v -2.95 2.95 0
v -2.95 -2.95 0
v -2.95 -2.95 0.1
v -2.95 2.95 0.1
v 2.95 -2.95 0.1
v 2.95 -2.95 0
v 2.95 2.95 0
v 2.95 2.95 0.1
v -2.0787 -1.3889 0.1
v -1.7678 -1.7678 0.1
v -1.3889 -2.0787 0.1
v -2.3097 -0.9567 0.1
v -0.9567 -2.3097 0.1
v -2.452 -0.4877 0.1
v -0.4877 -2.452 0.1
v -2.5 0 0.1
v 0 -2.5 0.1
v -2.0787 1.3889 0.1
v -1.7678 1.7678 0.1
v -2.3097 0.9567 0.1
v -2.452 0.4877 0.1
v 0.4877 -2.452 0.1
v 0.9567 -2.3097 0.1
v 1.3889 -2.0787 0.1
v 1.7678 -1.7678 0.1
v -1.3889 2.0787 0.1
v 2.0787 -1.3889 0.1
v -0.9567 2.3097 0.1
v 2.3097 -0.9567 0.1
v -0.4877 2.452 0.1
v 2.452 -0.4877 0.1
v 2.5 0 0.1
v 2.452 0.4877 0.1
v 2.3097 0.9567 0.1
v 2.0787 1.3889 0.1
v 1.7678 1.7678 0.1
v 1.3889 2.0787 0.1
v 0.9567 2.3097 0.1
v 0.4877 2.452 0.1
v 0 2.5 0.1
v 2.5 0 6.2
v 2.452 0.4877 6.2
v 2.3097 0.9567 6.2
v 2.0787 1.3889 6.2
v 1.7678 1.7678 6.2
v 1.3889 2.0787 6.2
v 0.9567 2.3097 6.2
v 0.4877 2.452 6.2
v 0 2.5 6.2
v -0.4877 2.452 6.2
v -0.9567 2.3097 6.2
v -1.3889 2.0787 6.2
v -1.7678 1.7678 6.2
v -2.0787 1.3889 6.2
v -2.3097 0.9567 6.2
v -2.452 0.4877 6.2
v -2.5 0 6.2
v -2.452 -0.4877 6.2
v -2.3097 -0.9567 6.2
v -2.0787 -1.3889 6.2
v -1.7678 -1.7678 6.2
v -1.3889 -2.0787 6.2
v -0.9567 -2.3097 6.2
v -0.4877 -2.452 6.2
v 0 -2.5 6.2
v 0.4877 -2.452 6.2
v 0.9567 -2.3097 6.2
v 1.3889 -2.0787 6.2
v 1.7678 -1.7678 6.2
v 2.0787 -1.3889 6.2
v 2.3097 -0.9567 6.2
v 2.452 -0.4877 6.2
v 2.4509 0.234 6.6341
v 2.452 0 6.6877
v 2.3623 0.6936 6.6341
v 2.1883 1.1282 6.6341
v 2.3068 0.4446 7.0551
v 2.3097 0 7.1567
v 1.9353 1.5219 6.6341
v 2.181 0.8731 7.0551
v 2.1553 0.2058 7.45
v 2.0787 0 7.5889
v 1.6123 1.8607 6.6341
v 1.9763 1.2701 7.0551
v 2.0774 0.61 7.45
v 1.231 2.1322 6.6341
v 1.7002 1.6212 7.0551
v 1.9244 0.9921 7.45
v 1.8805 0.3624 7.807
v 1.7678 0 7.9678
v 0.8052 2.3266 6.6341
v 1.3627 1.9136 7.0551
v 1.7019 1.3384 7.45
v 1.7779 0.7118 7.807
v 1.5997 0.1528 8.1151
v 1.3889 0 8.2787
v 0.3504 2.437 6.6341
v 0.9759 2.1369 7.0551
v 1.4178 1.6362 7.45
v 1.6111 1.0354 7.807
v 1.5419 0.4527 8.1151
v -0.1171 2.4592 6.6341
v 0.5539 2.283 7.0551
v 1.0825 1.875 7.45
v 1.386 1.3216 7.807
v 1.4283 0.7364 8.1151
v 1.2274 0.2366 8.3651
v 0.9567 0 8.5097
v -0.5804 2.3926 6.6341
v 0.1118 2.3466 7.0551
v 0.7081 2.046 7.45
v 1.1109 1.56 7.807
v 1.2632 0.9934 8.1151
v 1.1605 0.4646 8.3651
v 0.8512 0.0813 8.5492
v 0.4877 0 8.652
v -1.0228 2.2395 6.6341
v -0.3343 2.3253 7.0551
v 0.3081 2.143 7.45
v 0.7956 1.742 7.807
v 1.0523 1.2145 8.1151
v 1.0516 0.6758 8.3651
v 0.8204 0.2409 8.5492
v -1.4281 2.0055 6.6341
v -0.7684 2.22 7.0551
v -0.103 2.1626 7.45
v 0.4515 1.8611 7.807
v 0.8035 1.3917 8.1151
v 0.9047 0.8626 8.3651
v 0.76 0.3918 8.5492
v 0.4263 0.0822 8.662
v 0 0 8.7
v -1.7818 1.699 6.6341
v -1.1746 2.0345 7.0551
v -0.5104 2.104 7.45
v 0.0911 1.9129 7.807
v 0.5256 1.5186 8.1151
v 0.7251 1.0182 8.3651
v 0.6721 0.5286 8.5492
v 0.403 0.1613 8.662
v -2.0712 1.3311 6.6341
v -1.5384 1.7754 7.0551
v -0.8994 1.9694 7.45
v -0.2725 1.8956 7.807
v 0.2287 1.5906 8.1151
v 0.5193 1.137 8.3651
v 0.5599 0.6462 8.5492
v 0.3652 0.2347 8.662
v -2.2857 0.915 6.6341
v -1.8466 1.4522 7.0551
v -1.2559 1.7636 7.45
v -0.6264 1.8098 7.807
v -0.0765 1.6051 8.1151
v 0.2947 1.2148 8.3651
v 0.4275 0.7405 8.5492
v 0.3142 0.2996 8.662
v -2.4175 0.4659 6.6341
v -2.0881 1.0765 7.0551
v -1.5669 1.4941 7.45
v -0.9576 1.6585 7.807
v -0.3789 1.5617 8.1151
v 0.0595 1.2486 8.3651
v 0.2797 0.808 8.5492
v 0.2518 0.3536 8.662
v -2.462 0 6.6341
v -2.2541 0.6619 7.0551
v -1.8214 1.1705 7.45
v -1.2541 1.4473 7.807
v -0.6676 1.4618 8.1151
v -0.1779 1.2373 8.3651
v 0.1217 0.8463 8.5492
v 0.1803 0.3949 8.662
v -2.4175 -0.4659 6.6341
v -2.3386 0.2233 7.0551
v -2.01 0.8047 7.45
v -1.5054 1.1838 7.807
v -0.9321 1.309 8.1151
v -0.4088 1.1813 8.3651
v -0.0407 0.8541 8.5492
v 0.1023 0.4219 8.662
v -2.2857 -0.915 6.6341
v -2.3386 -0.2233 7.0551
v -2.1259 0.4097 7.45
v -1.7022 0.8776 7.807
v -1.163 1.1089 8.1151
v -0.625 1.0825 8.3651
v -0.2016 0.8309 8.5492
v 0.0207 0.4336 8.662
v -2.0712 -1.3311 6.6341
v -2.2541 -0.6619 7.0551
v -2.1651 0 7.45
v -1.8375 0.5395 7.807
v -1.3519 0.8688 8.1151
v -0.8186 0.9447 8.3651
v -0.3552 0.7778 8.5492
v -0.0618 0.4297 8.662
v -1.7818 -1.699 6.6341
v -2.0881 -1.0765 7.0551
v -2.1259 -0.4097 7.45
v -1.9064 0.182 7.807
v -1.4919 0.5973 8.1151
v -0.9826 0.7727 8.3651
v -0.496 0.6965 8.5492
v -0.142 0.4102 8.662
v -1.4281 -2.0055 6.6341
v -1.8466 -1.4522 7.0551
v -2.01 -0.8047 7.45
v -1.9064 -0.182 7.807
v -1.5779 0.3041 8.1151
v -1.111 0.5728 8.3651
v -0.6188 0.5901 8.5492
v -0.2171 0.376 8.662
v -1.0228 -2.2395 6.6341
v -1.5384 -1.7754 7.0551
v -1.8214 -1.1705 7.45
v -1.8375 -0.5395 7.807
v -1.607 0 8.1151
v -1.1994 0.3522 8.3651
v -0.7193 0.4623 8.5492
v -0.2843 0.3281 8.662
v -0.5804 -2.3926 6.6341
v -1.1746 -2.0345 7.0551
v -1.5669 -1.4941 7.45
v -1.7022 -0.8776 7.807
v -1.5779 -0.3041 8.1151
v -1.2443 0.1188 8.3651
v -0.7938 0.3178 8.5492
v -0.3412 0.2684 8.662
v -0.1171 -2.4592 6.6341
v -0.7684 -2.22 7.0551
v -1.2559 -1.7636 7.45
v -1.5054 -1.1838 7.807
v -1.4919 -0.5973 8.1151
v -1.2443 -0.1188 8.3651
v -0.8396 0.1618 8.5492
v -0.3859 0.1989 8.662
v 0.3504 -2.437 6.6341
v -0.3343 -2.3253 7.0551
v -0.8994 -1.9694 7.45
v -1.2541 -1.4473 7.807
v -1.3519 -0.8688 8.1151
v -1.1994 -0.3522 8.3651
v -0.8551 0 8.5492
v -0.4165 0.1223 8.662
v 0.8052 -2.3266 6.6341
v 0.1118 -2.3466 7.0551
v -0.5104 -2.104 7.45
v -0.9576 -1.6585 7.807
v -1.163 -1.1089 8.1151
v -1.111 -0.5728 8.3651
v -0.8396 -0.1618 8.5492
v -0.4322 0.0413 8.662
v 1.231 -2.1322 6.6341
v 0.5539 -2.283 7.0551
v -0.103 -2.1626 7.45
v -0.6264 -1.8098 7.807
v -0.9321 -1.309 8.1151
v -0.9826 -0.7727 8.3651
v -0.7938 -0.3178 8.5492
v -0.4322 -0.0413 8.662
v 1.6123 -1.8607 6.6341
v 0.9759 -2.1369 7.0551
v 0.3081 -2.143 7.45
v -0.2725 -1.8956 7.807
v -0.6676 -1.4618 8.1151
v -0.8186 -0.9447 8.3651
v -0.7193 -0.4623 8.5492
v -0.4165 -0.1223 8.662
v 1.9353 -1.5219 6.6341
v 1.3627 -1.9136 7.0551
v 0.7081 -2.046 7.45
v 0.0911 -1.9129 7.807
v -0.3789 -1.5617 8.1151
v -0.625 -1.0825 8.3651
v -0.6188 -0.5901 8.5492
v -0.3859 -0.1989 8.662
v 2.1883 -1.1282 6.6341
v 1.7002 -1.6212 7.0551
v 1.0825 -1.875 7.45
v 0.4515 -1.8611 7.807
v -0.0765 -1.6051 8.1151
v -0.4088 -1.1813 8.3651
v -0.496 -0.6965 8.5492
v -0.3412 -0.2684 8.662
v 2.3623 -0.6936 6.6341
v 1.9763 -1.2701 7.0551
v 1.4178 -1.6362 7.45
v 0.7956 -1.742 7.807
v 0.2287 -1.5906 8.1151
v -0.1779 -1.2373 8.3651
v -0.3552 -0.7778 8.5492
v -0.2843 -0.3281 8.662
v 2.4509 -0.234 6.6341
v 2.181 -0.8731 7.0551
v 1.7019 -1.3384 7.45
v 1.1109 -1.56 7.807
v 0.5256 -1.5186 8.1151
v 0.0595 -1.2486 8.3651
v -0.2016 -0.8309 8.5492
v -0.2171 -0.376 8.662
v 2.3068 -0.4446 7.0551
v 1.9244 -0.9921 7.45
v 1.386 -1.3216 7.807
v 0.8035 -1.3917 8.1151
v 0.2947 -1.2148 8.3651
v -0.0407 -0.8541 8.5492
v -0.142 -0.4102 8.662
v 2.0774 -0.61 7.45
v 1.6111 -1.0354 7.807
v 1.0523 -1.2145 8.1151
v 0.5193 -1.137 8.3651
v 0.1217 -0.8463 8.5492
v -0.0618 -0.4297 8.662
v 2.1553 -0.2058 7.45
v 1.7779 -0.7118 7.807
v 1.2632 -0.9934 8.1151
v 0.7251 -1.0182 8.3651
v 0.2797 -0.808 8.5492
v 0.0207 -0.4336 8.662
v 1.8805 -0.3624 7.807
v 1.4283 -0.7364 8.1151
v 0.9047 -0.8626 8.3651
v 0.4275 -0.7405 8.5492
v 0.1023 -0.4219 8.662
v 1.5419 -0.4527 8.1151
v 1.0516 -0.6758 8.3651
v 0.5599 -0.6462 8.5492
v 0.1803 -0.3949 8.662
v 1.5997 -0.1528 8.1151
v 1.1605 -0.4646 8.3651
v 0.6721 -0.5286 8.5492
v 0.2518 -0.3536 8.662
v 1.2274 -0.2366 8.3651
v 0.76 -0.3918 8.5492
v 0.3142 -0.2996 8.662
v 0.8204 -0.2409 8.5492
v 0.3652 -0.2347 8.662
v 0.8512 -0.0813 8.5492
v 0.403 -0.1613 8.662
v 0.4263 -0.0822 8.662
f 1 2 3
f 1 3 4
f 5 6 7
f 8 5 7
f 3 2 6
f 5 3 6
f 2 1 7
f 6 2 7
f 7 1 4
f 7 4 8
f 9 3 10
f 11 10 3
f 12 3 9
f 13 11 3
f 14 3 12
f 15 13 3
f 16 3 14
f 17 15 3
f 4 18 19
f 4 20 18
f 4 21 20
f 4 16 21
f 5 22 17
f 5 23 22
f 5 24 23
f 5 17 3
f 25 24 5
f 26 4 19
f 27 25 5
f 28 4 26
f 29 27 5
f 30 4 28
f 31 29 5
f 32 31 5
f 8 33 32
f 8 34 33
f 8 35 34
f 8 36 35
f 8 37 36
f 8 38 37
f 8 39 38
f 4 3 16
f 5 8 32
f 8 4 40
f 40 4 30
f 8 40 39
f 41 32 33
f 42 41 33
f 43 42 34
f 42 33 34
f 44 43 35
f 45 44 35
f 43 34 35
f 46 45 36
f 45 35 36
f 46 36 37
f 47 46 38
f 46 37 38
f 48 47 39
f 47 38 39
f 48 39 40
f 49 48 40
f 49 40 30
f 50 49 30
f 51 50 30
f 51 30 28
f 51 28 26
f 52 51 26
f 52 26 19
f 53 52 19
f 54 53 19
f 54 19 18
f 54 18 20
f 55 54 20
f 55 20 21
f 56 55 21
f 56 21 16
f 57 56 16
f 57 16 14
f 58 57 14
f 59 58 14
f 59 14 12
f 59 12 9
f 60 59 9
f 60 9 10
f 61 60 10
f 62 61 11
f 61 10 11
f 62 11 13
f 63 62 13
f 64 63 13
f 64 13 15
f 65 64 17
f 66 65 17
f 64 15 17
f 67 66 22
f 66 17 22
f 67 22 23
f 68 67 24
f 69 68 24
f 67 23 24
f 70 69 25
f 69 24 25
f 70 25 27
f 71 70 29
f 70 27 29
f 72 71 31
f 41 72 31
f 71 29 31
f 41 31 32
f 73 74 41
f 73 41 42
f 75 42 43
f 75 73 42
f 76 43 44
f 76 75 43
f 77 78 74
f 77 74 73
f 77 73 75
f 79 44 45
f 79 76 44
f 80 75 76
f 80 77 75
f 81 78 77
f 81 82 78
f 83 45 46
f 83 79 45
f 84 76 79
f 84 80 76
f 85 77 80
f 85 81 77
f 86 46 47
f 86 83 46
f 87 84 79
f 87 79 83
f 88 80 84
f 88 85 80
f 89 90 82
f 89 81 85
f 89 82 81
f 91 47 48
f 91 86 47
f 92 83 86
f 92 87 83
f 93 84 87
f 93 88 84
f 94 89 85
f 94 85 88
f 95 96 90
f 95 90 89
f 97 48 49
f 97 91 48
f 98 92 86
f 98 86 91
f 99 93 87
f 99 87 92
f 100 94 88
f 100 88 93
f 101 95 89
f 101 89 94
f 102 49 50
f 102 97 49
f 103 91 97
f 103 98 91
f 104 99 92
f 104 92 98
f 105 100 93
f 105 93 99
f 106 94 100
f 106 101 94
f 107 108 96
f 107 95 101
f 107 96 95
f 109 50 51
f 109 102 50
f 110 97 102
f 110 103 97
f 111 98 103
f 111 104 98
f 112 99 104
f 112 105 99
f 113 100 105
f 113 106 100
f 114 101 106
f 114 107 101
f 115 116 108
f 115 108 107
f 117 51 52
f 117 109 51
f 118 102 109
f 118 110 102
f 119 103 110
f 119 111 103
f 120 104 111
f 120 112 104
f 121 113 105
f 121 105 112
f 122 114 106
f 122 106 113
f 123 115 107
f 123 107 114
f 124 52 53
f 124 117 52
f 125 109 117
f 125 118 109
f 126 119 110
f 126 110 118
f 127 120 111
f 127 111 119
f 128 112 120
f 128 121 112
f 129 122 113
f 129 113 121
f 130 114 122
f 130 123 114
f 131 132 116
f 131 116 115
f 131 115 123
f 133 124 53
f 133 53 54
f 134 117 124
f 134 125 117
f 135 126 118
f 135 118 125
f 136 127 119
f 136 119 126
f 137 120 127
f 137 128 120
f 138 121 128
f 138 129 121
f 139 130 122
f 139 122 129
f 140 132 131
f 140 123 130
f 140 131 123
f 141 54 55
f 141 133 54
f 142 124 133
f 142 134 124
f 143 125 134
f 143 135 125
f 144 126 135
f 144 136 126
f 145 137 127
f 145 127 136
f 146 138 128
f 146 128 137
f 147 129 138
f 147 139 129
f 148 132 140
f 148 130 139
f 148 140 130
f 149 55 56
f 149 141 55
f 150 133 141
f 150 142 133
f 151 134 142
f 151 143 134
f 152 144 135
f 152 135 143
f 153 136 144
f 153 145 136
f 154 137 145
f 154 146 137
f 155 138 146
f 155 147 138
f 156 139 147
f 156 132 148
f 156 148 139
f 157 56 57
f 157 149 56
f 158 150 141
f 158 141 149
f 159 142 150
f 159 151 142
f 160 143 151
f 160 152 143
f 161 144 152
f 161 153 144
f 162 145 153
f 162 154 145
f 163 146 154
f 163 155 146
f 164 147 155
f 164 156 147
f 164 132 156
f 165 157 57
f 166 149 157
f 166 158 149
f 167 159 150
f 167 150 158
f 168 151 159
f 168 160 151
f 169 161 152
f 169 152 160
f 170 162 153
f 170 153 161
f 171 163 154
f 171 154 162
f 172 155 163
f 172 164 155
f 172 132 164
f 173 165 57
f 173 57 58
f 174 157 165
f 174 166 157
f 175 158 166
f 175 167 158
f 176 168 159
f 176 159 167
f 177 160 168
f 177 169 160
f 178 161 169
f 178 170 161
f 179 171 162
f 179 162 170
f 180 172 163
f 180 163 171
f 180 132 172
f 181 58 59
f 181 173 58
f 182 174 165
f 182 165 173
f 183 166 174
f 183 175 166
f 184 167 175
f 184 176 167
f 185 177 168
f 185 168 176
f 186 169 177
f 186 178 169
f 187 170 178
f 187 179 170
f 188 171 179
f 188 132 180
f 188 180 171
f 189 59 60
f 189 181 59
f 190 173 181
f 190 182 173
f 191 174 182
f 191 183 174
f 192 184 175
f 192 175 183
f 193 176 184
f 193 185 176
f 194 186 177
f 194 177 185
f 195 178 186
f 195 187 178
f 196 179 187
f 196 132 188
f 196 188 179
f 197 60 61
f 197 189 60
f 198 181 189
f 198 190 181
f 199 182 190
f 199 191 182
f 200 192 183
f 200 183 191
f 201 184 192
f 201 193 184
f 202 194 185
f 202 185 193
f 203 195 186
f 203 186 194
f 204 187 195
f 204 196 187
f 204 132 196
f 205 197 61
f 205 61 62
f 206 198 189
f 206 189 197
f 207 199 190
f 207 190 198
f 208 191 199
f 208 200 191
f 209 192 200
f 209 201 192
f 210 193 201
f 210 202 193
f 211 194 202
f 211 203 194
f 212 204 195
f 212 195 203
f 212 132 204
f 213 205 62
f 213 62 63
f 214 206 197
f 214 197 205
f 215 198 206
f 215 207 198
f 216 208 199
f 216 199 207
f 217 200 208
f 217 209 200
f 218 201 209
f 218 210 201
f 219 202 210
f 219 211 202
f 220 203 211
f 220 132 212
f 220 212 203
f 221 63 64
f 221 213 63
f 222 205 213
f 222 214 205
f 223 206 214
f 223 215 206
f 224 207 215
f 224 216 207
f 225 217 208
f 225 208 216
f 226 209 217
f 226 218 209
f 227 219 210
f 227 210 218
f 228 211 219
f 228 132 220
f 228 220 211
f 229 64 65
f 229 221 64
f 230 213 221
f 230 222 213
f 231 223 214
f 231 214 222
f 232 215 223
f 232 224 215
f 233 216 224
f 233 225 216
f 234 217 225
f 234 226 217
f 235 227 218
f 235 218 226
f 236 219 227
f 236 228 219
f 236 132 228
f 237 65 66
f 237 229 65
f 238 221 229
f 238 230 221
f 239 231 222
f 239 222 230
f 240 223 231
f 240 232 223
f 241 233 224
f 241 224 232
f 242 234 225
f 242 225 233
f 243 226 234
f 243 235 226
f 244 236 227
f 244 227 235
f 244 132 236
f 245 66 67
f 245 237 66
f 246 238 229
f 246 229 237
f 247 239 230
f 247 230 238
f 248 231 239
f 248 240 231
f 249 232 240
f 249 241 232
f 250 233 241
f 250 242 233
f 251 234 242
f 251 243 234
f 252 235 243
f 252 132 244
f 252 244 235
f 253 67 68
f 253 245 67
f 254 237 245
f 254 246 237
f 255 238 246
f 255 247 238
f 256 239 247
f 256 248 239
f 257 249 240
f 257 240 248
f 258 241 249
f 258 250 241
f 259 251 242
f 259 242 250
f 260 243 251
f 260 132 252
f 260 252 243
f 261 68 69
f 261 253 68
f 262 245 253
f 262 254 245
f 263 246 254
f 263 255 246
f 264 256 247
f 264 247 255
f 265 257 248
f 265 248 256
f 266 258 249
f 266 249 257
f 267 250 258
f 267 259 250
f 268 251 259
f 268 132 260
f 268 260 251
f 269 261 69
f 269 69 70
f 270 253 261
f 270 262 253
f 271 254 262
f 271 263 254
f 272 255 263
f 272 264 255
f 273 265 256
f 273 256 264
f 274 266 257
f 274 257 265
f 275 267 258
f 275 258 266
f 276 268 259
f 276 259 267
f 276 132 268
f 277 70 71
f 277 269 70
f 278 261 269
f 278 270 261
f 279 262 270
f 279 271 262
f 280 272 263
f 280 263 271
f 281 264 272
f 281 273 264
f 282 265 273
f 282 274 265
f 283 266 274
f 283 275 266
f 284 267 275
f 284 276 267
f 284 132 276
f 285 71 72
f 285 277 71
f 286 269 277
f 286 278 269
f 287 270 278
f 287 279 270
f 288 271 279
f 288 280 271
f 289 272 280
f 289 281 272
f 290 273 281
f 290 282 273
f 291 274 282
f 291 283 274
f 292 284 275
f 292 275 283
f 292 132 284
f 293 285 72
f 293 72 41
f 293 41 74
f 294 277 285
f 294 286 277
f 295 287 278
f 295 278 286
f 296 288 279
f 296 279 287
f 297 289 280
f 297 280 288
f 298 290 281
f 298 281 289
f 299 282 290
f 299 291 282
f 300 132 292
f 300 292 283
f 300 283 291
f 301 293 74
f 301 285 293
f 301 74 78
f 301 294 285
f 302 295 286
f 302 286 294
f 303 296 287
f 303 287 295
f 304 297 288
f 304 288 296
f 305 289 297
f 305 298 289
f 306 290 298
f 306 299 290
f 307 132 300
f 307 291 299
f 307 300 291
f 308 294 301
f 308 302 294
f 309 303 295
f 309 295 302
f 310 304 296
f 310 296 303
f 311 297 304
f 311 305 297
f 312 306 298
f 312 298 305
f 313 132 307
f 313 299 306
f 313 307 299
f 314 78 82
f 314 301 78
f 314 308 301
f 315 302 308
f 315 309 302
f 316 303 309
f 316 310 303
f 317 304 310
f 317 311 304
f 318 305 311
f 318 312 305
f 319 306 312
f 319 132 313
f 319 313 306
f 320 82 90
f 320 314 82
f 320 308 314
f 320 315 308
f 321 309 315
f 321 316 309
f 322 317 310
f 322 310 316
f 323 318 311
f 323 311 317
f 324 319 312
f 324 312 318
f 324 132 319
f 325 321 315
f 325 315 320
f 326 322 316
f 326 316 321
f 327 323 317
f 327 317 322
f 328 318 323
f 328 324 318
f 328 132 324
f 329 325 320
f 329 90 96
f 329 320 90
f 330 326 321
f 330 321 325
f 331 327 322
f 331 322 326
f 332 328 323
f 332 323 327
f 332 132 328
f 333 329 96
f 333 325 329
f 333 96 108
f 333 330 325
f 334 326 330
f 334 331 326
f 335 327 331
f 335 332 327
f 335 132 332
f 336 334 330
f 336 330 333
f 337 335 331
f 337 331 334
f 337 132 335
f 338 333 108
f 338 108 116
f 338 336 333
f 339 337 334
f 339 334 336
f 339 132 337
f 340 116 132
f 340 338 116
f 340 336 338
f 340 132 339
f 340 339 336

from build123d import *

# Parameters (mm, degrees)
F0_W     = 5.9
F0_H     = 5.9
F0_R     = 2.5
F1_DEPTH = 0.1
F2_DEPTH = 8.7
F3_R     = 2.5


with BuildPart() as f1:
    # F0 (on Top) → F1 (new body)
    with BuildSketch(Plane.XY):
        Rectangle(F0_W, F0_H)
        Circle(F0_R, mode=Mode.SUBTRACT)
    extrude(amount=F1_DEPTH)

    # F0 (on Top) → F2 (join)
    with BuildSketch(Plane.XY):
        Circle(F0_R)
    extrude(amount=F2_DEPTH)

    # F3
    f3_edges = [f1.edges().sort_by_distance(p)[0] for p in [
        (-2.5, 0, 8.7),
    ]]
    fillet(f3_edges, radius=F3_R)


solid = f1.part
